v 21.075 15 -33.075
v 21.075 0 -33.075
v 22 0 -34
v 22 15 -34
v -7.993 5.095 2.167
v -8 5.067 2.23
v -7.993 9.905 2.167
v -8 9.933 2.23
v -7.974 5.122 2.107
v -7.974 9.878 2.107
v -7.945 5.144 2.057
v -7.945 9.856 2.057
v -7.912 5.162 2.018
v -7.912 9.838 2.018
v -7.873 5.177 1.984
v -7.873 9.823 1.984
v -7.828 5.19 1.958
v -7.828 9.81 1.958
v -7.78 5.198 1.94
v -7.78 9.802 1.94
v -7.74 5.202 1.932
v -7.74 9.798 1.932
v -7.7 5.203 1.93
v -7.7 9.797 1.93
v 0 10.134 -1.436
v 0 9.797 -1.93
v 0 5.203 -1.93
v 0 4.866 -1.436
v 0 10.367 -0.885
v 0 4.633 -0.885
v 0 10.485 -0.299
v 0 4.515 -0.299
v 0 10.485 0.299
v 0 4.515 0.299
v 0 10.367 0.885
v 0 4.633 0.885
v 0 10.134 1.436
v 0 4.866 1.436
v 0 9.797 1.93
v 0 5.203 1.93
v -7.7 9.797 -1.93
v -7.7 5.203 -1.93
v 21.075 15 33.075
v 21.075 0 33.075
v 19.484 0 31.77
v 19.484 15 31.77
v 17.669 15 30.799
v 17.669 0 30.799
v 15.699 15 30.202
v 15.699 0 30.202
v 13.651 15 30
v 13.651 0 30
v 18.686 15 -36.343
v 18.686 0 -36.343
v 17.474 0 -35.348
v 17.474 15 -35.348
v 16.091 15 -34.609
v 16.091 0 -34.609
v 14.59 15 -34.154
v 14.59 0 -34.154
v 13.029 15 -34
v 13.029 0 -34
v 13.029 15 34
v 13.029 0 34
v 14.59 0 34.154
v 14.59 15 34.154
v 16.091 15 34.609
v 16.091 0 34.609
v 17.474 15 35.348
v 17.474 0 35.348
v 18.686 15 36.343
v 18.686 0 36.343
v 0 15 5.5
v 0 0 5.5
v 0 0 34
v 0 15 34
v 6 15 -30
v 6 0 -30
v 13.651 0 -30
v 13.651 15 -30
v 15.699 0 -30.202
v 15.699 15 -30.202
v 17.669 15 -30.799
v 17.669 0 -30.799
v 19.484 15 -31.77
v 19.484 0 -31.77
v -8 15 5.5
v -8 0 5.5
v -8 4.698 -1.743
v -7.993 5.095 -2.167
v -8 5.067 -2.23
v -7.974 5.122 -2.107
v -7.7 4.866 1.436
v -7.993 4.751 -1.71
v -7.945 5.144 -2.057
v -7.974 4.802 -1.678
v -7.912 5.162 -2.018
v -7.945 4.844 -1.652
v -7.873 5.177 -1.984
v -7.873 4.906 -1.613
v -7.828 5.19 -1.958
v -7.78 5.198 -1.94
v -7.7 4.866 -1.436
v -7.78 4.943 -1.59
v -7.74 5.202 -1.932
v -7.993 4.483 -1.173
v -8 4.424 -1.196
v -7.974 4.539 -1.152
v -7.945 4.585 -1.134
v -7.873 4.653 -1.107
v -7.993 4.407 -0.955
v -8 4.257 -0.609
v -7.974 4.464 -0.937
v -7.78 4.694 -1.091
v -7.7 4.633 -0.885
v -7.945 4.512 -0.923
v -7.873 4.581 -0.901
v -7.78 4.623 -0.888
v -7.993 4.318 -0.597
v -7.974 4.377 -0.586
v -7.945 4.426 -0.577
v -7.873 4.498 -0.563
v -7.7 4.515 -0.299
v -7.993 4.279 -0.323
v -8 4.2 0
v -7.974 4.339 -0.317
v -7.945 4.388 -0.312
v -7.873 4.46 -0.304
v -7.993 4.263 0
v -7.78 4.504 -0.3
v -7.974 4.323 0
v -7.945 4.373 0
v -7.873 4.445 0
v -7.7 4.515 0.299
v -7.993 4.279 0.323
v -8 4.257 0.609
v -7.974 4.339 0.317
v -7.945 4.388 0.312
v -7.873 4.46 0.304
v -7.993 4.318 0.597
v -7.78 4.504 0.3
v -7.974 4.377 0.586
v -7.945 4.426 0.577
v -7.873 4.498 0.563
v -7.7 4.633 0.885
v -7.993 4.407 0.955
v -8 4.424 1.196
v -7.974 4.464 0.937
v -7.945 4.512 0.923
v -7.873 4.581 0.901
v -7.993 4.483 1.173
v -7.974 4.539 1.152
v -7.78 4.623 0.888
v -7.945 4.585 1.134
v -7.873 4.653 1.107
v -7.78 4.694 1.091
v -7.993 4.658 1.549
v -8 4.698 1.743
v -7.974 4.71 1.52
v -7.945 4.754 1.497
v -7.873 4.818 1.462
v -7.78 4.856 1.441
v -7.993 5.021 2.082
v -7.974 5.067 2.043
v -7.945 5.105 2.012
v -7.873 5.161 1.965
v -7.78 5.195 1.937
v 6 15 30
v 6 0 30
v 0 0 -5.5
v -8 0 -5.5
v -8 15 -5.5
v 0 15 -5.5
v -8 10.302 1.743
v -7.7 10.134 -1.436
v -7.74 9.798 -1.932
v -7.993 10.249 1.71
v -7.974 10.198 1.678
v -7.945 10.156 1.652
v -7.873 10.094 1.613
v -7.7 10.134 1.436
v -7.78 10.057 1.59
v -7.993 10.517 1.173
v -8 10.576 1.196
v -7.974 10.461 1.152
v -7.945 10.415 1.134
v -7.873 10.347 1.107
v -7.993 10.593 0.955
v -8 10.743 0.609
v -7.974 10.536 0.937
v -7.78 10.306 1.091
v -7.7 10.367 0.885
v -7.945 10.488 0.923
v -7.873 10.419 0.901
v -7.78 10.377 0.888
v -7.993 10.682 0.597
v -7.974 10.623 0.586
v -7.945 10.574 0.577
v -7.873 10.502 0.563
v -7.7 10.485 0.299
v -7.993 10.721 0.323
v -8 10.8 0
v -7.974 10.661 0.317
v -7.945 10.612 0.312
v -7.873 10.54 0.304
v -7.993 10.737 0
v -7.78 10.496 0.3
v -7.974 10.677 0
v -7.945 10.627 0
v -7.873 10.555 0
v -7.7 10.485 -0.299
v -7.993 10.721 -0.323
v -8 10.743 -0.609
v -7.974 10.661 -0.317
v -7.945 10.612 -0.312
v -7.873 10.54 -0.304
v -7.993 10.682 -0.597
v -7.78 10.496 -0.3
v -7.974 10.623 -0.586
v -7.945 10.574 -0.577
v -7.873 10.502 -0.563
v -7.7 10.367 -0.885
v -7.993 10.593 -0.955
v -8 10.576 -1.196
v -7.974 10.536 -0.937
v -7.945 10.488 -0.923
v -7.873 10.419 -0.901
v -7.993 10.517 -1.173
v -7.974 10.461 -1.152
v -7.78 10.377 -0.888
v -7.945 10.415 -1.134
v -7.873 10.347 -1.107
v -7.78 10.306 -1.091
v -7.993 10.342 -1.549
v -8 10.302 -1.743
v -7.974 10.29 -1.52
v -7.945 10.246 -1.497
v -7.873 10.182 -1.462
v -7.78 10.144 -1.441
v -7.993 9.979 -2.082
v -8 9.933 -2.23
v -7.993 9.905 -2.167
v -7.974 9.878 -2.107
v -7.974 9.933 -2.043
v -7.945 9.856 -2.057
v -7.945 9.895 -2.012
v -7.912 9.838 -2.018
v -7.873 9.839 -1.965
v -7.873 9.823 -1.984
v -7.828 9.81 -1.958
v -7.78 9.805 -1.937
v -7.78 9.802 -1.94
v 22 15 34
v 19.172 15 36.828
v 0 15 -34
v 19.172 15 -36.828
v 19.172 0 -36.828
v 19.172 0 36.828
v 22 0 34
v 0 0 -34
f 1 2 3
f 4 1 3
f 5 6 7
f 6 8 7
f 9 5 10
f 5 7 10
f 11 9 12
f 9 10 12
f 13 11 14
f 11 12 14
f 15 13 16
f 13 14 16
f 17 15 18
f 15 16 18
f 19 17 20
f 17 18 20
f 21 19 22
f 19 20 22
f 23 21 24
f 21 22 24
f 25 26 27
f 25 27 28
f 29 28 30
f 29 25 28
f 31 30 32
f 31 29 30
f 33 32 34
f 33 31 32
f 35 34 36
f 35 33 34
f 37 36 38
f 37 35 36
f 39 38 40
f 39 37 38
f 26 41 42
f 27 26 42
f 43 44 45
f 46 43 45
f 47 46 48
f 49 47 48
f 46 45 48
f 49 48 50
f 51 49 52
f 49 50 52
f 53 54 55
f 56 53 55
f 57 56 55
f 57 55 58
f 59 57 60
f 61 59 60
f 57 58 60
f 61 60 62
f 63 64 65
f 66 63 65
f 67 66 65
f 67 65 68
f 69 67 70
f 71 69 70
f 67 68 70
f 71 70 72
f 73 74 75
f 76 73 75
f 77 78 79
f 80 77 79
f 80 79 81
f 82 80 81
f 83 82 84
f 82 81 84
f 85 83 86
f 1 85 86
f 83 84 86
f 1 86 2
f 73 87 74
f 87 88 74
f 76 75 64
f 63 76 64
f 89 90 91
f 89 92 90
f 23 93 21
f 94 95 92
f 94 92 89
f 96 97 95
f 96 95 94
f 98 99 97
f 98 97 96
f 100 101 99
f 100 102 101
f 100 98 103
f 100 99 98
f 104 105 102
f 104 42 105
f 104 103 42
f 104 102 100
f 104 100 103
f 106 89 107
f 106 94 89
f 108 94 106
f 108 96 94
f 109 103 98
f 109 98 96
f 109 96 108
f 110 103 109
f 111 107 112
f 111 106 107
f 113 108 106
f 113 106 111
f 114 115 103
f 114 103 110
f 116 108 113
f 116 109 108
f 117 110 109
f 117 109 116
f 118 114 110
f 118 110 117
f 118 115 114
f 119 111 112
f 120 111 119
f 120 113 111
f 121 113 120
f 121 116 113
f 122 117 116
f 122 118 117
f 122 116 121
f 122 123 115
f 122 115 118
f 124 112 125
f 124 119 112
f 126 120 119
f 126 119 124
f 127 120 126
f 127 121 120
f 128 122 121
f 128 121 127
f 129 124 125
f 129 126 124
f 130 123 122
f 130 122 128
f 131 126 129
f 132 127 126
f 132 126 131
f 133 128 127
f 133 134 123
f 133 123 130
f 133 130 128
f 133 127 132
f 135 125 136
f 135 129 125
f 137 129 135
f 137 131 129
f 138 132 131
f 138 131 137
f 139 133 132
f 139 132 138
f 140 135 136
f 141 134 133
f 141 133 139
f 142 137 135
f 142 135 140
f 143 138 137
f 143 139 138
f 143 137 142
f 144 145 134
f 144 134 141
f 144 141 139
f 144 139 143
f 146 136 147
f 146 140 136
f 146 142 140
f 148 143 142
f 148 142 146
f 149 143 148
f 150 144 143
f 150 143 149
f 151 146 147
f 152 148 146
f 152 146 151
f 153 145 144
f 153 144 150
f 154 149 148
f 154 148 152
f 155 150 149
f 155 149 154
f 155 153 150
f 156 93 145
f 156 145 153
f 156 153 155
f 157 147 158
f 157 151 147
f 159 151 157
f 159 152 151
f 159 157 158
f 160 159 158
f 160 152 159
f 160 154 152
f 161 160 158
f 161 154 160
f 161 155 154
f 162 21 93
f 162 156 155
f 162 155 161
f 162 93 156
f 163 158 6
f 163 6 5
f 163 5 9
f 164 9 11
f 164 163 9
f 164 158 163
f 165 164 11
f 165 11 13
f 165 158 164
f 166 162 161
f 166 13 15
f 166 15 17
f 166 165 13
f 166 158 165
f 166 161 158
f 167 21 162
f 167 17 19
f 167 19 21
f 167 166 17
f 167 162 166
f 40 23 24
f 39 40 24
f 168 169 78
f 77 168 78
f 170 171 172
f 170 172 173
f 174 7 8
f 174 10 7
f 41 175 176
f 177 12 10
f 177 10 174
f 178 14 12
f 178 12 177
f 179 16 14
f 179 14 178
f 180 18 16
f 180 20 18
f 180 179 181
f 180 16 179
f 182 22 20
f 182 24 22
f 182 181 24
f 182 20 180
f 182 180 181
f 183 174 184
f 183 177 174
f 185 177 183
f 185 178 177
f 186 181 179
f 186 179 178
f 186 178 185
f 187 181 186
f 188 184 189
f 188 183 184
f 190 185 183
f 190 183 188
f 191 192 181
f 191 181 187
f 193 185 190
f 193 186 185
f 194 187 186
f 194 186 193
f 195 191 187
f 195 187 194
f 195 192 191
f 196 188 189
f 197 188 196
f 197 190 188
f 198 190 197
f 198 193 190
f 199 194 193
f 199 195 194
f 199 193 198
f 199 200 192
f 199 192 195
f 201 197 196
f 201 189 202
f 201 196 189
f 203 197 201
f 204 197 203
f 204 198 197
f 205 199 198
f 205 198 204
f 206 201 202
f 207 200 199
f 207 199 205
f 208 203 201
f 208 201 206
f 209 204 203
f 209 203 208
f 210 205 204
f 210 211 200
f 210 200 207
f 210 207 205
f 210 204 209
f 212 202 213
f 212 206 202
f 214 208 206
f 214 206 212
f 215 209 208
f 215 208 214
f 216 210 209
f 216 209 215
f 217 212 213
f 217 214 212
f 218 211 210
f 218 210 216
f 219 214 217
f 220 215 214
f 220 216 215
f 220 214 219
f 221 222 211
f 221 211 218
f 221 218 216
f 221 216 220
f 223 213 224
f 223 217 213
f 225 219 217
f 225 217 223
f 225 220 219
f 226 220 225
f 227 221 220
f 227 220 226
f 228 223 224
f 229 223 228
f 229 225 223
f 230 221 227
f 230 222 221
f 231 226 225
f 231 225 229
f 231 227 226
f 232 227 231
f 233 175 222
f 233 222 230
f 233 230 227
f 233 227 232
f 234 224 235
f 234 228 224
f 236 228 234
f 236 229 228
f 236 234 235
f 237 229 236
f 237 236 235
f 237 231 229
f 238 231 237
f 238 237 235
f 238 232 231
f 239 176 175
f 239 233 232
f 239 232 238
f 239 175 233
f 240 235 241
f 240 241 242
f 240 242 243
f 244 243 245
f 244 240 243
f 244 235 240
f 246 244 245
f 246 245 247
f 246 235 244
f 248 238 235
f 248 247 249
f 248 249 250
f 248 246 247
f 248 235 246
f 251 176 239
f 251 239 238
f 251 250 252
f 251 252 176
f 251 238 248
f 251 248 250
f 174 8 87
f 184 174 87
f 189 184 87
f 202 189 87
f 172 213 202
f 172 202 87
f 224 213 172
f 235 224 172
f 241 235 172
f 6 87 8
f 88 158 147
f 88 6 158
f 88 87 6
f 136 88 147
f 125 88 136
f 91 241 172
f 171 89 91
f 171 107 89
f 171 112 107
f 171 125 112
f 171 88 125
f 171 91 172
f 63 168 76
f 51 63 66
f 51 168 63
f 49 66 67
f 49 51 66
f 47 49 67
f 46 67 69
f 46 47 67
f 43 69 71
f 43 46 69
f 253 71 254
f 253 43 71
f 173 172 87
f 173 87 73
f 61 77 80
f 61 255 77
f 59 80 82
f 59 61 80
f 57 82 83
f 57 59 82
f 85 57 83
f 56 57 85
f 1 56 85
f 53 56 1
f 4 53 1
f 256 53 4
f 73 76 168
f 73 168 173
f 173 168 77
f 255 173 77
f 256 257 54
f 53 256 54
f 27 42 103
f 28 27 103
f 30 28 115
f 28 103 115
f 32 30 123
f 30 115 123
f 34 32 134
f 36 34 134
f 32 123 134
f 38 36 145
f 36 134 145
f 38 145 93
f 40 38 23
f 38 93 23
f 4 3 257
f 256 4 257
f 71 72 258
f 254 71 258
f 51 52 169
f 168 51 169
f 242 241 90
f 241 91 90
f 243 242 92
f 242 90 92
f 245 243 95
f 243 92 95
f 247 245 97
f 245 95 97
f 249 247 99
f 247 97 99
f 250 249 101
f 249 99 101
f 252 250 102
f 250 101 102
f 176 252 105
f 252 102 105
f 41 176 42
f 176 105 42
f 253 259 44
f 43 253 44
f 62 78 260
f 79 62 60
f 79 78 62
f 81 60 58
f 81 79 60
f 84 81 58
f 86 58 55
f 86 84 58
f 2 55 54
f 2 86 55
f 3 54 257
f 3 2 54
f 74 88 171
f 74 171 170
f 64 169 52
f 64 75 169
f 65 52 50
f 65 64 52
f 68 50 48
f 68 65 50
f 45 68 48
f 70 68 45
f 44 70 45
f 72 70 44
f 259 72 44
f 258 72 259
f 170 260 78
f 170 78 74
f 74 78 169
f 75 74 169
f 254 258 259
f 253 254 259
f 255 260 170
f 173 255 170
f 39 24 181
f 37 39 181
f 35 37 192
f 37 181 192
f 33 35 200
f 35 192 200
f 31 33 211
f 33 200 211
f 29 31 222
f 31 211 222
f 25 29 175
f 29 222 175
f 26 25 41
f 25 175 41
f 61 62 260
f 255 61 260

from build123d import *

# Parameters (mm, degrees)
BOSS_EXTRUDE2_DEPTH = 15
BOSS_EXTRUDE3_DEPTH = 8
CUT_EXTRUDE3_DEPTH  = 8
FILLET1_R           = 0.3
SKETCH5_W           = 8
SKETCH5_H           = 11
BOSS_EXTRUDE4_DEPTH = 3
SKETCH6_W           = 8
SKETCH6_H           = 11
BOSS_EXTRUDE5_DEPTH = 3


with BuildPart() as part:
    # Sketch1 → Boss-Extrude2 (new body)
    with BuildSketch(Plane(origin=(0, 0, 0), x_dir=(1, 0, 0), z_dir=(0, 1, 0))):
        with BuildLine():
            Line((0, 34), (0, 0))
            Line((0, 0), (6, 0))
            Line((6, 0), (6, 30))
            Line((6, 30), (13.650757595, 30))
            ThreePointArc((13.650757595, 30), (17.668933635, 30.799264909), (21.075378798, 33.075378798))
            Line((21.075378798, 33.075378798), (22, 34))
            Line((22, 34), (19.171572875, 36.828427125))
            Line((19.171572875, 36.828427125), (18.686291501, 36.343145751))
            ThreePointArc((18.686291501, 36.343145751), (16.09090471, 34.60896374), (13.029437252, 34))
            Line((13.029437252, 34), (0, 34))
        make_face()
        with BuildLine():
            Line((0, 0), (0, -34))
            Line((0, -34), (13.029437252, -34))
            ThreePointArc((13.029437252, -34), (16.09090471, -34.60896374), (18.686291501, -36.343145751))
            Line((18.686291501, -36.343145751), (19.171572875, -36.828427125))
            Line((19.171572875, -36.828427125), (22, -34))
            Line((22, -34), (21.075378798, -33.075378798))
            ThreePointArc((21.075378798, -33.075378798), (17.668933635, -30.799264909), (13.650757595, -30))
            Line((13.650757595, -30), (6, -30))
            Line((6, -30), (6, 0))
            Line((6, 0), (0, 0))
        make_face()
    extrude(amount=BOSS_EXTRUDE2_DEPTH)

    # Sketch3 → Boss-Extrude3 (add)
    with BuildSketch(Plane.ZY):
        Polygon((0, 7.5), (-5.5, 6.286764706), (-5.5, 3), (5.5, 3), (5.5, 6.286764706), align=None)
        Polygon((-5.5, 8.713235294), (0, 7.5), (5.5, 8.713235294), (5.5, 12), (-5.5, 12), align=None)
        Polygon((-5.5, 8.713235294), (-5.5, 6.286764706), (0, 7.5), align=None)
        Polygon((5.5, 8.713235294), (0, 7.5), (5.5, 6.286764706), align=None)
    extrude(amount=BOSS_EXTRUDE3_DEPTH)

    # Sketch4 → Cut-Extrude3 (cut)
    with BuildSketch(Plane.ZY.offset(8)):
        with BuildLine():
            Line((-1.929617446, 9.797079997), (-1.929617446, 5.202920003))
            ThreePointArc((-1.929617446, 5.202920003), (0, 4.5), (1.929617446, 5.202920003))
            Line((1.929617446, 5.202920003), (1.929617446, 9.797079997))
            ThreePointArc((1.929617446, 9.797079997), (0, 10.5), (-1.929617446, 9.797079997))
        make_face()
    extrude(amount=-CUT_EXTRUDE3_DEPTH, mode=Mode.SUBTRACT)

    # Fillet1
    fillet1_edges = [part.edges().sort_by_distance(p)[0] for p in [
        (-8, 7.5, 1.929617446),
        (-8, 10.5, 0),
        (-8, 7.5, -1.929617446),
        (-8, 4.5, 0),
    ]]
    fillet(fillet1_edges, radius=FILLET1_R)

    # Sketch5 → Boss-Extrude4 (add)
    with BuildSketch(Plane.XZ.offset(-3)):
        with Locations((-4, 0)):
            Rectangle(SKETCH5_W, SKETCH5_H)
    extrude(amount=BOSS_EXTRUDE4_DEPTH)

    # Sketch6 → Boss-Extrude5 (add)
    with BuildSketch(Plane(origin=(0, 12, 0), x_dir=(1, 0, 0), z_dir=(0, 1, 0))):
        with Locations((-4, 0)):
            Rectangle(SKETCH6_W, SKETCH6_H)
    extrude(amount=BOSS_EXTRUDE5_DEPTH)


solid = part.part
